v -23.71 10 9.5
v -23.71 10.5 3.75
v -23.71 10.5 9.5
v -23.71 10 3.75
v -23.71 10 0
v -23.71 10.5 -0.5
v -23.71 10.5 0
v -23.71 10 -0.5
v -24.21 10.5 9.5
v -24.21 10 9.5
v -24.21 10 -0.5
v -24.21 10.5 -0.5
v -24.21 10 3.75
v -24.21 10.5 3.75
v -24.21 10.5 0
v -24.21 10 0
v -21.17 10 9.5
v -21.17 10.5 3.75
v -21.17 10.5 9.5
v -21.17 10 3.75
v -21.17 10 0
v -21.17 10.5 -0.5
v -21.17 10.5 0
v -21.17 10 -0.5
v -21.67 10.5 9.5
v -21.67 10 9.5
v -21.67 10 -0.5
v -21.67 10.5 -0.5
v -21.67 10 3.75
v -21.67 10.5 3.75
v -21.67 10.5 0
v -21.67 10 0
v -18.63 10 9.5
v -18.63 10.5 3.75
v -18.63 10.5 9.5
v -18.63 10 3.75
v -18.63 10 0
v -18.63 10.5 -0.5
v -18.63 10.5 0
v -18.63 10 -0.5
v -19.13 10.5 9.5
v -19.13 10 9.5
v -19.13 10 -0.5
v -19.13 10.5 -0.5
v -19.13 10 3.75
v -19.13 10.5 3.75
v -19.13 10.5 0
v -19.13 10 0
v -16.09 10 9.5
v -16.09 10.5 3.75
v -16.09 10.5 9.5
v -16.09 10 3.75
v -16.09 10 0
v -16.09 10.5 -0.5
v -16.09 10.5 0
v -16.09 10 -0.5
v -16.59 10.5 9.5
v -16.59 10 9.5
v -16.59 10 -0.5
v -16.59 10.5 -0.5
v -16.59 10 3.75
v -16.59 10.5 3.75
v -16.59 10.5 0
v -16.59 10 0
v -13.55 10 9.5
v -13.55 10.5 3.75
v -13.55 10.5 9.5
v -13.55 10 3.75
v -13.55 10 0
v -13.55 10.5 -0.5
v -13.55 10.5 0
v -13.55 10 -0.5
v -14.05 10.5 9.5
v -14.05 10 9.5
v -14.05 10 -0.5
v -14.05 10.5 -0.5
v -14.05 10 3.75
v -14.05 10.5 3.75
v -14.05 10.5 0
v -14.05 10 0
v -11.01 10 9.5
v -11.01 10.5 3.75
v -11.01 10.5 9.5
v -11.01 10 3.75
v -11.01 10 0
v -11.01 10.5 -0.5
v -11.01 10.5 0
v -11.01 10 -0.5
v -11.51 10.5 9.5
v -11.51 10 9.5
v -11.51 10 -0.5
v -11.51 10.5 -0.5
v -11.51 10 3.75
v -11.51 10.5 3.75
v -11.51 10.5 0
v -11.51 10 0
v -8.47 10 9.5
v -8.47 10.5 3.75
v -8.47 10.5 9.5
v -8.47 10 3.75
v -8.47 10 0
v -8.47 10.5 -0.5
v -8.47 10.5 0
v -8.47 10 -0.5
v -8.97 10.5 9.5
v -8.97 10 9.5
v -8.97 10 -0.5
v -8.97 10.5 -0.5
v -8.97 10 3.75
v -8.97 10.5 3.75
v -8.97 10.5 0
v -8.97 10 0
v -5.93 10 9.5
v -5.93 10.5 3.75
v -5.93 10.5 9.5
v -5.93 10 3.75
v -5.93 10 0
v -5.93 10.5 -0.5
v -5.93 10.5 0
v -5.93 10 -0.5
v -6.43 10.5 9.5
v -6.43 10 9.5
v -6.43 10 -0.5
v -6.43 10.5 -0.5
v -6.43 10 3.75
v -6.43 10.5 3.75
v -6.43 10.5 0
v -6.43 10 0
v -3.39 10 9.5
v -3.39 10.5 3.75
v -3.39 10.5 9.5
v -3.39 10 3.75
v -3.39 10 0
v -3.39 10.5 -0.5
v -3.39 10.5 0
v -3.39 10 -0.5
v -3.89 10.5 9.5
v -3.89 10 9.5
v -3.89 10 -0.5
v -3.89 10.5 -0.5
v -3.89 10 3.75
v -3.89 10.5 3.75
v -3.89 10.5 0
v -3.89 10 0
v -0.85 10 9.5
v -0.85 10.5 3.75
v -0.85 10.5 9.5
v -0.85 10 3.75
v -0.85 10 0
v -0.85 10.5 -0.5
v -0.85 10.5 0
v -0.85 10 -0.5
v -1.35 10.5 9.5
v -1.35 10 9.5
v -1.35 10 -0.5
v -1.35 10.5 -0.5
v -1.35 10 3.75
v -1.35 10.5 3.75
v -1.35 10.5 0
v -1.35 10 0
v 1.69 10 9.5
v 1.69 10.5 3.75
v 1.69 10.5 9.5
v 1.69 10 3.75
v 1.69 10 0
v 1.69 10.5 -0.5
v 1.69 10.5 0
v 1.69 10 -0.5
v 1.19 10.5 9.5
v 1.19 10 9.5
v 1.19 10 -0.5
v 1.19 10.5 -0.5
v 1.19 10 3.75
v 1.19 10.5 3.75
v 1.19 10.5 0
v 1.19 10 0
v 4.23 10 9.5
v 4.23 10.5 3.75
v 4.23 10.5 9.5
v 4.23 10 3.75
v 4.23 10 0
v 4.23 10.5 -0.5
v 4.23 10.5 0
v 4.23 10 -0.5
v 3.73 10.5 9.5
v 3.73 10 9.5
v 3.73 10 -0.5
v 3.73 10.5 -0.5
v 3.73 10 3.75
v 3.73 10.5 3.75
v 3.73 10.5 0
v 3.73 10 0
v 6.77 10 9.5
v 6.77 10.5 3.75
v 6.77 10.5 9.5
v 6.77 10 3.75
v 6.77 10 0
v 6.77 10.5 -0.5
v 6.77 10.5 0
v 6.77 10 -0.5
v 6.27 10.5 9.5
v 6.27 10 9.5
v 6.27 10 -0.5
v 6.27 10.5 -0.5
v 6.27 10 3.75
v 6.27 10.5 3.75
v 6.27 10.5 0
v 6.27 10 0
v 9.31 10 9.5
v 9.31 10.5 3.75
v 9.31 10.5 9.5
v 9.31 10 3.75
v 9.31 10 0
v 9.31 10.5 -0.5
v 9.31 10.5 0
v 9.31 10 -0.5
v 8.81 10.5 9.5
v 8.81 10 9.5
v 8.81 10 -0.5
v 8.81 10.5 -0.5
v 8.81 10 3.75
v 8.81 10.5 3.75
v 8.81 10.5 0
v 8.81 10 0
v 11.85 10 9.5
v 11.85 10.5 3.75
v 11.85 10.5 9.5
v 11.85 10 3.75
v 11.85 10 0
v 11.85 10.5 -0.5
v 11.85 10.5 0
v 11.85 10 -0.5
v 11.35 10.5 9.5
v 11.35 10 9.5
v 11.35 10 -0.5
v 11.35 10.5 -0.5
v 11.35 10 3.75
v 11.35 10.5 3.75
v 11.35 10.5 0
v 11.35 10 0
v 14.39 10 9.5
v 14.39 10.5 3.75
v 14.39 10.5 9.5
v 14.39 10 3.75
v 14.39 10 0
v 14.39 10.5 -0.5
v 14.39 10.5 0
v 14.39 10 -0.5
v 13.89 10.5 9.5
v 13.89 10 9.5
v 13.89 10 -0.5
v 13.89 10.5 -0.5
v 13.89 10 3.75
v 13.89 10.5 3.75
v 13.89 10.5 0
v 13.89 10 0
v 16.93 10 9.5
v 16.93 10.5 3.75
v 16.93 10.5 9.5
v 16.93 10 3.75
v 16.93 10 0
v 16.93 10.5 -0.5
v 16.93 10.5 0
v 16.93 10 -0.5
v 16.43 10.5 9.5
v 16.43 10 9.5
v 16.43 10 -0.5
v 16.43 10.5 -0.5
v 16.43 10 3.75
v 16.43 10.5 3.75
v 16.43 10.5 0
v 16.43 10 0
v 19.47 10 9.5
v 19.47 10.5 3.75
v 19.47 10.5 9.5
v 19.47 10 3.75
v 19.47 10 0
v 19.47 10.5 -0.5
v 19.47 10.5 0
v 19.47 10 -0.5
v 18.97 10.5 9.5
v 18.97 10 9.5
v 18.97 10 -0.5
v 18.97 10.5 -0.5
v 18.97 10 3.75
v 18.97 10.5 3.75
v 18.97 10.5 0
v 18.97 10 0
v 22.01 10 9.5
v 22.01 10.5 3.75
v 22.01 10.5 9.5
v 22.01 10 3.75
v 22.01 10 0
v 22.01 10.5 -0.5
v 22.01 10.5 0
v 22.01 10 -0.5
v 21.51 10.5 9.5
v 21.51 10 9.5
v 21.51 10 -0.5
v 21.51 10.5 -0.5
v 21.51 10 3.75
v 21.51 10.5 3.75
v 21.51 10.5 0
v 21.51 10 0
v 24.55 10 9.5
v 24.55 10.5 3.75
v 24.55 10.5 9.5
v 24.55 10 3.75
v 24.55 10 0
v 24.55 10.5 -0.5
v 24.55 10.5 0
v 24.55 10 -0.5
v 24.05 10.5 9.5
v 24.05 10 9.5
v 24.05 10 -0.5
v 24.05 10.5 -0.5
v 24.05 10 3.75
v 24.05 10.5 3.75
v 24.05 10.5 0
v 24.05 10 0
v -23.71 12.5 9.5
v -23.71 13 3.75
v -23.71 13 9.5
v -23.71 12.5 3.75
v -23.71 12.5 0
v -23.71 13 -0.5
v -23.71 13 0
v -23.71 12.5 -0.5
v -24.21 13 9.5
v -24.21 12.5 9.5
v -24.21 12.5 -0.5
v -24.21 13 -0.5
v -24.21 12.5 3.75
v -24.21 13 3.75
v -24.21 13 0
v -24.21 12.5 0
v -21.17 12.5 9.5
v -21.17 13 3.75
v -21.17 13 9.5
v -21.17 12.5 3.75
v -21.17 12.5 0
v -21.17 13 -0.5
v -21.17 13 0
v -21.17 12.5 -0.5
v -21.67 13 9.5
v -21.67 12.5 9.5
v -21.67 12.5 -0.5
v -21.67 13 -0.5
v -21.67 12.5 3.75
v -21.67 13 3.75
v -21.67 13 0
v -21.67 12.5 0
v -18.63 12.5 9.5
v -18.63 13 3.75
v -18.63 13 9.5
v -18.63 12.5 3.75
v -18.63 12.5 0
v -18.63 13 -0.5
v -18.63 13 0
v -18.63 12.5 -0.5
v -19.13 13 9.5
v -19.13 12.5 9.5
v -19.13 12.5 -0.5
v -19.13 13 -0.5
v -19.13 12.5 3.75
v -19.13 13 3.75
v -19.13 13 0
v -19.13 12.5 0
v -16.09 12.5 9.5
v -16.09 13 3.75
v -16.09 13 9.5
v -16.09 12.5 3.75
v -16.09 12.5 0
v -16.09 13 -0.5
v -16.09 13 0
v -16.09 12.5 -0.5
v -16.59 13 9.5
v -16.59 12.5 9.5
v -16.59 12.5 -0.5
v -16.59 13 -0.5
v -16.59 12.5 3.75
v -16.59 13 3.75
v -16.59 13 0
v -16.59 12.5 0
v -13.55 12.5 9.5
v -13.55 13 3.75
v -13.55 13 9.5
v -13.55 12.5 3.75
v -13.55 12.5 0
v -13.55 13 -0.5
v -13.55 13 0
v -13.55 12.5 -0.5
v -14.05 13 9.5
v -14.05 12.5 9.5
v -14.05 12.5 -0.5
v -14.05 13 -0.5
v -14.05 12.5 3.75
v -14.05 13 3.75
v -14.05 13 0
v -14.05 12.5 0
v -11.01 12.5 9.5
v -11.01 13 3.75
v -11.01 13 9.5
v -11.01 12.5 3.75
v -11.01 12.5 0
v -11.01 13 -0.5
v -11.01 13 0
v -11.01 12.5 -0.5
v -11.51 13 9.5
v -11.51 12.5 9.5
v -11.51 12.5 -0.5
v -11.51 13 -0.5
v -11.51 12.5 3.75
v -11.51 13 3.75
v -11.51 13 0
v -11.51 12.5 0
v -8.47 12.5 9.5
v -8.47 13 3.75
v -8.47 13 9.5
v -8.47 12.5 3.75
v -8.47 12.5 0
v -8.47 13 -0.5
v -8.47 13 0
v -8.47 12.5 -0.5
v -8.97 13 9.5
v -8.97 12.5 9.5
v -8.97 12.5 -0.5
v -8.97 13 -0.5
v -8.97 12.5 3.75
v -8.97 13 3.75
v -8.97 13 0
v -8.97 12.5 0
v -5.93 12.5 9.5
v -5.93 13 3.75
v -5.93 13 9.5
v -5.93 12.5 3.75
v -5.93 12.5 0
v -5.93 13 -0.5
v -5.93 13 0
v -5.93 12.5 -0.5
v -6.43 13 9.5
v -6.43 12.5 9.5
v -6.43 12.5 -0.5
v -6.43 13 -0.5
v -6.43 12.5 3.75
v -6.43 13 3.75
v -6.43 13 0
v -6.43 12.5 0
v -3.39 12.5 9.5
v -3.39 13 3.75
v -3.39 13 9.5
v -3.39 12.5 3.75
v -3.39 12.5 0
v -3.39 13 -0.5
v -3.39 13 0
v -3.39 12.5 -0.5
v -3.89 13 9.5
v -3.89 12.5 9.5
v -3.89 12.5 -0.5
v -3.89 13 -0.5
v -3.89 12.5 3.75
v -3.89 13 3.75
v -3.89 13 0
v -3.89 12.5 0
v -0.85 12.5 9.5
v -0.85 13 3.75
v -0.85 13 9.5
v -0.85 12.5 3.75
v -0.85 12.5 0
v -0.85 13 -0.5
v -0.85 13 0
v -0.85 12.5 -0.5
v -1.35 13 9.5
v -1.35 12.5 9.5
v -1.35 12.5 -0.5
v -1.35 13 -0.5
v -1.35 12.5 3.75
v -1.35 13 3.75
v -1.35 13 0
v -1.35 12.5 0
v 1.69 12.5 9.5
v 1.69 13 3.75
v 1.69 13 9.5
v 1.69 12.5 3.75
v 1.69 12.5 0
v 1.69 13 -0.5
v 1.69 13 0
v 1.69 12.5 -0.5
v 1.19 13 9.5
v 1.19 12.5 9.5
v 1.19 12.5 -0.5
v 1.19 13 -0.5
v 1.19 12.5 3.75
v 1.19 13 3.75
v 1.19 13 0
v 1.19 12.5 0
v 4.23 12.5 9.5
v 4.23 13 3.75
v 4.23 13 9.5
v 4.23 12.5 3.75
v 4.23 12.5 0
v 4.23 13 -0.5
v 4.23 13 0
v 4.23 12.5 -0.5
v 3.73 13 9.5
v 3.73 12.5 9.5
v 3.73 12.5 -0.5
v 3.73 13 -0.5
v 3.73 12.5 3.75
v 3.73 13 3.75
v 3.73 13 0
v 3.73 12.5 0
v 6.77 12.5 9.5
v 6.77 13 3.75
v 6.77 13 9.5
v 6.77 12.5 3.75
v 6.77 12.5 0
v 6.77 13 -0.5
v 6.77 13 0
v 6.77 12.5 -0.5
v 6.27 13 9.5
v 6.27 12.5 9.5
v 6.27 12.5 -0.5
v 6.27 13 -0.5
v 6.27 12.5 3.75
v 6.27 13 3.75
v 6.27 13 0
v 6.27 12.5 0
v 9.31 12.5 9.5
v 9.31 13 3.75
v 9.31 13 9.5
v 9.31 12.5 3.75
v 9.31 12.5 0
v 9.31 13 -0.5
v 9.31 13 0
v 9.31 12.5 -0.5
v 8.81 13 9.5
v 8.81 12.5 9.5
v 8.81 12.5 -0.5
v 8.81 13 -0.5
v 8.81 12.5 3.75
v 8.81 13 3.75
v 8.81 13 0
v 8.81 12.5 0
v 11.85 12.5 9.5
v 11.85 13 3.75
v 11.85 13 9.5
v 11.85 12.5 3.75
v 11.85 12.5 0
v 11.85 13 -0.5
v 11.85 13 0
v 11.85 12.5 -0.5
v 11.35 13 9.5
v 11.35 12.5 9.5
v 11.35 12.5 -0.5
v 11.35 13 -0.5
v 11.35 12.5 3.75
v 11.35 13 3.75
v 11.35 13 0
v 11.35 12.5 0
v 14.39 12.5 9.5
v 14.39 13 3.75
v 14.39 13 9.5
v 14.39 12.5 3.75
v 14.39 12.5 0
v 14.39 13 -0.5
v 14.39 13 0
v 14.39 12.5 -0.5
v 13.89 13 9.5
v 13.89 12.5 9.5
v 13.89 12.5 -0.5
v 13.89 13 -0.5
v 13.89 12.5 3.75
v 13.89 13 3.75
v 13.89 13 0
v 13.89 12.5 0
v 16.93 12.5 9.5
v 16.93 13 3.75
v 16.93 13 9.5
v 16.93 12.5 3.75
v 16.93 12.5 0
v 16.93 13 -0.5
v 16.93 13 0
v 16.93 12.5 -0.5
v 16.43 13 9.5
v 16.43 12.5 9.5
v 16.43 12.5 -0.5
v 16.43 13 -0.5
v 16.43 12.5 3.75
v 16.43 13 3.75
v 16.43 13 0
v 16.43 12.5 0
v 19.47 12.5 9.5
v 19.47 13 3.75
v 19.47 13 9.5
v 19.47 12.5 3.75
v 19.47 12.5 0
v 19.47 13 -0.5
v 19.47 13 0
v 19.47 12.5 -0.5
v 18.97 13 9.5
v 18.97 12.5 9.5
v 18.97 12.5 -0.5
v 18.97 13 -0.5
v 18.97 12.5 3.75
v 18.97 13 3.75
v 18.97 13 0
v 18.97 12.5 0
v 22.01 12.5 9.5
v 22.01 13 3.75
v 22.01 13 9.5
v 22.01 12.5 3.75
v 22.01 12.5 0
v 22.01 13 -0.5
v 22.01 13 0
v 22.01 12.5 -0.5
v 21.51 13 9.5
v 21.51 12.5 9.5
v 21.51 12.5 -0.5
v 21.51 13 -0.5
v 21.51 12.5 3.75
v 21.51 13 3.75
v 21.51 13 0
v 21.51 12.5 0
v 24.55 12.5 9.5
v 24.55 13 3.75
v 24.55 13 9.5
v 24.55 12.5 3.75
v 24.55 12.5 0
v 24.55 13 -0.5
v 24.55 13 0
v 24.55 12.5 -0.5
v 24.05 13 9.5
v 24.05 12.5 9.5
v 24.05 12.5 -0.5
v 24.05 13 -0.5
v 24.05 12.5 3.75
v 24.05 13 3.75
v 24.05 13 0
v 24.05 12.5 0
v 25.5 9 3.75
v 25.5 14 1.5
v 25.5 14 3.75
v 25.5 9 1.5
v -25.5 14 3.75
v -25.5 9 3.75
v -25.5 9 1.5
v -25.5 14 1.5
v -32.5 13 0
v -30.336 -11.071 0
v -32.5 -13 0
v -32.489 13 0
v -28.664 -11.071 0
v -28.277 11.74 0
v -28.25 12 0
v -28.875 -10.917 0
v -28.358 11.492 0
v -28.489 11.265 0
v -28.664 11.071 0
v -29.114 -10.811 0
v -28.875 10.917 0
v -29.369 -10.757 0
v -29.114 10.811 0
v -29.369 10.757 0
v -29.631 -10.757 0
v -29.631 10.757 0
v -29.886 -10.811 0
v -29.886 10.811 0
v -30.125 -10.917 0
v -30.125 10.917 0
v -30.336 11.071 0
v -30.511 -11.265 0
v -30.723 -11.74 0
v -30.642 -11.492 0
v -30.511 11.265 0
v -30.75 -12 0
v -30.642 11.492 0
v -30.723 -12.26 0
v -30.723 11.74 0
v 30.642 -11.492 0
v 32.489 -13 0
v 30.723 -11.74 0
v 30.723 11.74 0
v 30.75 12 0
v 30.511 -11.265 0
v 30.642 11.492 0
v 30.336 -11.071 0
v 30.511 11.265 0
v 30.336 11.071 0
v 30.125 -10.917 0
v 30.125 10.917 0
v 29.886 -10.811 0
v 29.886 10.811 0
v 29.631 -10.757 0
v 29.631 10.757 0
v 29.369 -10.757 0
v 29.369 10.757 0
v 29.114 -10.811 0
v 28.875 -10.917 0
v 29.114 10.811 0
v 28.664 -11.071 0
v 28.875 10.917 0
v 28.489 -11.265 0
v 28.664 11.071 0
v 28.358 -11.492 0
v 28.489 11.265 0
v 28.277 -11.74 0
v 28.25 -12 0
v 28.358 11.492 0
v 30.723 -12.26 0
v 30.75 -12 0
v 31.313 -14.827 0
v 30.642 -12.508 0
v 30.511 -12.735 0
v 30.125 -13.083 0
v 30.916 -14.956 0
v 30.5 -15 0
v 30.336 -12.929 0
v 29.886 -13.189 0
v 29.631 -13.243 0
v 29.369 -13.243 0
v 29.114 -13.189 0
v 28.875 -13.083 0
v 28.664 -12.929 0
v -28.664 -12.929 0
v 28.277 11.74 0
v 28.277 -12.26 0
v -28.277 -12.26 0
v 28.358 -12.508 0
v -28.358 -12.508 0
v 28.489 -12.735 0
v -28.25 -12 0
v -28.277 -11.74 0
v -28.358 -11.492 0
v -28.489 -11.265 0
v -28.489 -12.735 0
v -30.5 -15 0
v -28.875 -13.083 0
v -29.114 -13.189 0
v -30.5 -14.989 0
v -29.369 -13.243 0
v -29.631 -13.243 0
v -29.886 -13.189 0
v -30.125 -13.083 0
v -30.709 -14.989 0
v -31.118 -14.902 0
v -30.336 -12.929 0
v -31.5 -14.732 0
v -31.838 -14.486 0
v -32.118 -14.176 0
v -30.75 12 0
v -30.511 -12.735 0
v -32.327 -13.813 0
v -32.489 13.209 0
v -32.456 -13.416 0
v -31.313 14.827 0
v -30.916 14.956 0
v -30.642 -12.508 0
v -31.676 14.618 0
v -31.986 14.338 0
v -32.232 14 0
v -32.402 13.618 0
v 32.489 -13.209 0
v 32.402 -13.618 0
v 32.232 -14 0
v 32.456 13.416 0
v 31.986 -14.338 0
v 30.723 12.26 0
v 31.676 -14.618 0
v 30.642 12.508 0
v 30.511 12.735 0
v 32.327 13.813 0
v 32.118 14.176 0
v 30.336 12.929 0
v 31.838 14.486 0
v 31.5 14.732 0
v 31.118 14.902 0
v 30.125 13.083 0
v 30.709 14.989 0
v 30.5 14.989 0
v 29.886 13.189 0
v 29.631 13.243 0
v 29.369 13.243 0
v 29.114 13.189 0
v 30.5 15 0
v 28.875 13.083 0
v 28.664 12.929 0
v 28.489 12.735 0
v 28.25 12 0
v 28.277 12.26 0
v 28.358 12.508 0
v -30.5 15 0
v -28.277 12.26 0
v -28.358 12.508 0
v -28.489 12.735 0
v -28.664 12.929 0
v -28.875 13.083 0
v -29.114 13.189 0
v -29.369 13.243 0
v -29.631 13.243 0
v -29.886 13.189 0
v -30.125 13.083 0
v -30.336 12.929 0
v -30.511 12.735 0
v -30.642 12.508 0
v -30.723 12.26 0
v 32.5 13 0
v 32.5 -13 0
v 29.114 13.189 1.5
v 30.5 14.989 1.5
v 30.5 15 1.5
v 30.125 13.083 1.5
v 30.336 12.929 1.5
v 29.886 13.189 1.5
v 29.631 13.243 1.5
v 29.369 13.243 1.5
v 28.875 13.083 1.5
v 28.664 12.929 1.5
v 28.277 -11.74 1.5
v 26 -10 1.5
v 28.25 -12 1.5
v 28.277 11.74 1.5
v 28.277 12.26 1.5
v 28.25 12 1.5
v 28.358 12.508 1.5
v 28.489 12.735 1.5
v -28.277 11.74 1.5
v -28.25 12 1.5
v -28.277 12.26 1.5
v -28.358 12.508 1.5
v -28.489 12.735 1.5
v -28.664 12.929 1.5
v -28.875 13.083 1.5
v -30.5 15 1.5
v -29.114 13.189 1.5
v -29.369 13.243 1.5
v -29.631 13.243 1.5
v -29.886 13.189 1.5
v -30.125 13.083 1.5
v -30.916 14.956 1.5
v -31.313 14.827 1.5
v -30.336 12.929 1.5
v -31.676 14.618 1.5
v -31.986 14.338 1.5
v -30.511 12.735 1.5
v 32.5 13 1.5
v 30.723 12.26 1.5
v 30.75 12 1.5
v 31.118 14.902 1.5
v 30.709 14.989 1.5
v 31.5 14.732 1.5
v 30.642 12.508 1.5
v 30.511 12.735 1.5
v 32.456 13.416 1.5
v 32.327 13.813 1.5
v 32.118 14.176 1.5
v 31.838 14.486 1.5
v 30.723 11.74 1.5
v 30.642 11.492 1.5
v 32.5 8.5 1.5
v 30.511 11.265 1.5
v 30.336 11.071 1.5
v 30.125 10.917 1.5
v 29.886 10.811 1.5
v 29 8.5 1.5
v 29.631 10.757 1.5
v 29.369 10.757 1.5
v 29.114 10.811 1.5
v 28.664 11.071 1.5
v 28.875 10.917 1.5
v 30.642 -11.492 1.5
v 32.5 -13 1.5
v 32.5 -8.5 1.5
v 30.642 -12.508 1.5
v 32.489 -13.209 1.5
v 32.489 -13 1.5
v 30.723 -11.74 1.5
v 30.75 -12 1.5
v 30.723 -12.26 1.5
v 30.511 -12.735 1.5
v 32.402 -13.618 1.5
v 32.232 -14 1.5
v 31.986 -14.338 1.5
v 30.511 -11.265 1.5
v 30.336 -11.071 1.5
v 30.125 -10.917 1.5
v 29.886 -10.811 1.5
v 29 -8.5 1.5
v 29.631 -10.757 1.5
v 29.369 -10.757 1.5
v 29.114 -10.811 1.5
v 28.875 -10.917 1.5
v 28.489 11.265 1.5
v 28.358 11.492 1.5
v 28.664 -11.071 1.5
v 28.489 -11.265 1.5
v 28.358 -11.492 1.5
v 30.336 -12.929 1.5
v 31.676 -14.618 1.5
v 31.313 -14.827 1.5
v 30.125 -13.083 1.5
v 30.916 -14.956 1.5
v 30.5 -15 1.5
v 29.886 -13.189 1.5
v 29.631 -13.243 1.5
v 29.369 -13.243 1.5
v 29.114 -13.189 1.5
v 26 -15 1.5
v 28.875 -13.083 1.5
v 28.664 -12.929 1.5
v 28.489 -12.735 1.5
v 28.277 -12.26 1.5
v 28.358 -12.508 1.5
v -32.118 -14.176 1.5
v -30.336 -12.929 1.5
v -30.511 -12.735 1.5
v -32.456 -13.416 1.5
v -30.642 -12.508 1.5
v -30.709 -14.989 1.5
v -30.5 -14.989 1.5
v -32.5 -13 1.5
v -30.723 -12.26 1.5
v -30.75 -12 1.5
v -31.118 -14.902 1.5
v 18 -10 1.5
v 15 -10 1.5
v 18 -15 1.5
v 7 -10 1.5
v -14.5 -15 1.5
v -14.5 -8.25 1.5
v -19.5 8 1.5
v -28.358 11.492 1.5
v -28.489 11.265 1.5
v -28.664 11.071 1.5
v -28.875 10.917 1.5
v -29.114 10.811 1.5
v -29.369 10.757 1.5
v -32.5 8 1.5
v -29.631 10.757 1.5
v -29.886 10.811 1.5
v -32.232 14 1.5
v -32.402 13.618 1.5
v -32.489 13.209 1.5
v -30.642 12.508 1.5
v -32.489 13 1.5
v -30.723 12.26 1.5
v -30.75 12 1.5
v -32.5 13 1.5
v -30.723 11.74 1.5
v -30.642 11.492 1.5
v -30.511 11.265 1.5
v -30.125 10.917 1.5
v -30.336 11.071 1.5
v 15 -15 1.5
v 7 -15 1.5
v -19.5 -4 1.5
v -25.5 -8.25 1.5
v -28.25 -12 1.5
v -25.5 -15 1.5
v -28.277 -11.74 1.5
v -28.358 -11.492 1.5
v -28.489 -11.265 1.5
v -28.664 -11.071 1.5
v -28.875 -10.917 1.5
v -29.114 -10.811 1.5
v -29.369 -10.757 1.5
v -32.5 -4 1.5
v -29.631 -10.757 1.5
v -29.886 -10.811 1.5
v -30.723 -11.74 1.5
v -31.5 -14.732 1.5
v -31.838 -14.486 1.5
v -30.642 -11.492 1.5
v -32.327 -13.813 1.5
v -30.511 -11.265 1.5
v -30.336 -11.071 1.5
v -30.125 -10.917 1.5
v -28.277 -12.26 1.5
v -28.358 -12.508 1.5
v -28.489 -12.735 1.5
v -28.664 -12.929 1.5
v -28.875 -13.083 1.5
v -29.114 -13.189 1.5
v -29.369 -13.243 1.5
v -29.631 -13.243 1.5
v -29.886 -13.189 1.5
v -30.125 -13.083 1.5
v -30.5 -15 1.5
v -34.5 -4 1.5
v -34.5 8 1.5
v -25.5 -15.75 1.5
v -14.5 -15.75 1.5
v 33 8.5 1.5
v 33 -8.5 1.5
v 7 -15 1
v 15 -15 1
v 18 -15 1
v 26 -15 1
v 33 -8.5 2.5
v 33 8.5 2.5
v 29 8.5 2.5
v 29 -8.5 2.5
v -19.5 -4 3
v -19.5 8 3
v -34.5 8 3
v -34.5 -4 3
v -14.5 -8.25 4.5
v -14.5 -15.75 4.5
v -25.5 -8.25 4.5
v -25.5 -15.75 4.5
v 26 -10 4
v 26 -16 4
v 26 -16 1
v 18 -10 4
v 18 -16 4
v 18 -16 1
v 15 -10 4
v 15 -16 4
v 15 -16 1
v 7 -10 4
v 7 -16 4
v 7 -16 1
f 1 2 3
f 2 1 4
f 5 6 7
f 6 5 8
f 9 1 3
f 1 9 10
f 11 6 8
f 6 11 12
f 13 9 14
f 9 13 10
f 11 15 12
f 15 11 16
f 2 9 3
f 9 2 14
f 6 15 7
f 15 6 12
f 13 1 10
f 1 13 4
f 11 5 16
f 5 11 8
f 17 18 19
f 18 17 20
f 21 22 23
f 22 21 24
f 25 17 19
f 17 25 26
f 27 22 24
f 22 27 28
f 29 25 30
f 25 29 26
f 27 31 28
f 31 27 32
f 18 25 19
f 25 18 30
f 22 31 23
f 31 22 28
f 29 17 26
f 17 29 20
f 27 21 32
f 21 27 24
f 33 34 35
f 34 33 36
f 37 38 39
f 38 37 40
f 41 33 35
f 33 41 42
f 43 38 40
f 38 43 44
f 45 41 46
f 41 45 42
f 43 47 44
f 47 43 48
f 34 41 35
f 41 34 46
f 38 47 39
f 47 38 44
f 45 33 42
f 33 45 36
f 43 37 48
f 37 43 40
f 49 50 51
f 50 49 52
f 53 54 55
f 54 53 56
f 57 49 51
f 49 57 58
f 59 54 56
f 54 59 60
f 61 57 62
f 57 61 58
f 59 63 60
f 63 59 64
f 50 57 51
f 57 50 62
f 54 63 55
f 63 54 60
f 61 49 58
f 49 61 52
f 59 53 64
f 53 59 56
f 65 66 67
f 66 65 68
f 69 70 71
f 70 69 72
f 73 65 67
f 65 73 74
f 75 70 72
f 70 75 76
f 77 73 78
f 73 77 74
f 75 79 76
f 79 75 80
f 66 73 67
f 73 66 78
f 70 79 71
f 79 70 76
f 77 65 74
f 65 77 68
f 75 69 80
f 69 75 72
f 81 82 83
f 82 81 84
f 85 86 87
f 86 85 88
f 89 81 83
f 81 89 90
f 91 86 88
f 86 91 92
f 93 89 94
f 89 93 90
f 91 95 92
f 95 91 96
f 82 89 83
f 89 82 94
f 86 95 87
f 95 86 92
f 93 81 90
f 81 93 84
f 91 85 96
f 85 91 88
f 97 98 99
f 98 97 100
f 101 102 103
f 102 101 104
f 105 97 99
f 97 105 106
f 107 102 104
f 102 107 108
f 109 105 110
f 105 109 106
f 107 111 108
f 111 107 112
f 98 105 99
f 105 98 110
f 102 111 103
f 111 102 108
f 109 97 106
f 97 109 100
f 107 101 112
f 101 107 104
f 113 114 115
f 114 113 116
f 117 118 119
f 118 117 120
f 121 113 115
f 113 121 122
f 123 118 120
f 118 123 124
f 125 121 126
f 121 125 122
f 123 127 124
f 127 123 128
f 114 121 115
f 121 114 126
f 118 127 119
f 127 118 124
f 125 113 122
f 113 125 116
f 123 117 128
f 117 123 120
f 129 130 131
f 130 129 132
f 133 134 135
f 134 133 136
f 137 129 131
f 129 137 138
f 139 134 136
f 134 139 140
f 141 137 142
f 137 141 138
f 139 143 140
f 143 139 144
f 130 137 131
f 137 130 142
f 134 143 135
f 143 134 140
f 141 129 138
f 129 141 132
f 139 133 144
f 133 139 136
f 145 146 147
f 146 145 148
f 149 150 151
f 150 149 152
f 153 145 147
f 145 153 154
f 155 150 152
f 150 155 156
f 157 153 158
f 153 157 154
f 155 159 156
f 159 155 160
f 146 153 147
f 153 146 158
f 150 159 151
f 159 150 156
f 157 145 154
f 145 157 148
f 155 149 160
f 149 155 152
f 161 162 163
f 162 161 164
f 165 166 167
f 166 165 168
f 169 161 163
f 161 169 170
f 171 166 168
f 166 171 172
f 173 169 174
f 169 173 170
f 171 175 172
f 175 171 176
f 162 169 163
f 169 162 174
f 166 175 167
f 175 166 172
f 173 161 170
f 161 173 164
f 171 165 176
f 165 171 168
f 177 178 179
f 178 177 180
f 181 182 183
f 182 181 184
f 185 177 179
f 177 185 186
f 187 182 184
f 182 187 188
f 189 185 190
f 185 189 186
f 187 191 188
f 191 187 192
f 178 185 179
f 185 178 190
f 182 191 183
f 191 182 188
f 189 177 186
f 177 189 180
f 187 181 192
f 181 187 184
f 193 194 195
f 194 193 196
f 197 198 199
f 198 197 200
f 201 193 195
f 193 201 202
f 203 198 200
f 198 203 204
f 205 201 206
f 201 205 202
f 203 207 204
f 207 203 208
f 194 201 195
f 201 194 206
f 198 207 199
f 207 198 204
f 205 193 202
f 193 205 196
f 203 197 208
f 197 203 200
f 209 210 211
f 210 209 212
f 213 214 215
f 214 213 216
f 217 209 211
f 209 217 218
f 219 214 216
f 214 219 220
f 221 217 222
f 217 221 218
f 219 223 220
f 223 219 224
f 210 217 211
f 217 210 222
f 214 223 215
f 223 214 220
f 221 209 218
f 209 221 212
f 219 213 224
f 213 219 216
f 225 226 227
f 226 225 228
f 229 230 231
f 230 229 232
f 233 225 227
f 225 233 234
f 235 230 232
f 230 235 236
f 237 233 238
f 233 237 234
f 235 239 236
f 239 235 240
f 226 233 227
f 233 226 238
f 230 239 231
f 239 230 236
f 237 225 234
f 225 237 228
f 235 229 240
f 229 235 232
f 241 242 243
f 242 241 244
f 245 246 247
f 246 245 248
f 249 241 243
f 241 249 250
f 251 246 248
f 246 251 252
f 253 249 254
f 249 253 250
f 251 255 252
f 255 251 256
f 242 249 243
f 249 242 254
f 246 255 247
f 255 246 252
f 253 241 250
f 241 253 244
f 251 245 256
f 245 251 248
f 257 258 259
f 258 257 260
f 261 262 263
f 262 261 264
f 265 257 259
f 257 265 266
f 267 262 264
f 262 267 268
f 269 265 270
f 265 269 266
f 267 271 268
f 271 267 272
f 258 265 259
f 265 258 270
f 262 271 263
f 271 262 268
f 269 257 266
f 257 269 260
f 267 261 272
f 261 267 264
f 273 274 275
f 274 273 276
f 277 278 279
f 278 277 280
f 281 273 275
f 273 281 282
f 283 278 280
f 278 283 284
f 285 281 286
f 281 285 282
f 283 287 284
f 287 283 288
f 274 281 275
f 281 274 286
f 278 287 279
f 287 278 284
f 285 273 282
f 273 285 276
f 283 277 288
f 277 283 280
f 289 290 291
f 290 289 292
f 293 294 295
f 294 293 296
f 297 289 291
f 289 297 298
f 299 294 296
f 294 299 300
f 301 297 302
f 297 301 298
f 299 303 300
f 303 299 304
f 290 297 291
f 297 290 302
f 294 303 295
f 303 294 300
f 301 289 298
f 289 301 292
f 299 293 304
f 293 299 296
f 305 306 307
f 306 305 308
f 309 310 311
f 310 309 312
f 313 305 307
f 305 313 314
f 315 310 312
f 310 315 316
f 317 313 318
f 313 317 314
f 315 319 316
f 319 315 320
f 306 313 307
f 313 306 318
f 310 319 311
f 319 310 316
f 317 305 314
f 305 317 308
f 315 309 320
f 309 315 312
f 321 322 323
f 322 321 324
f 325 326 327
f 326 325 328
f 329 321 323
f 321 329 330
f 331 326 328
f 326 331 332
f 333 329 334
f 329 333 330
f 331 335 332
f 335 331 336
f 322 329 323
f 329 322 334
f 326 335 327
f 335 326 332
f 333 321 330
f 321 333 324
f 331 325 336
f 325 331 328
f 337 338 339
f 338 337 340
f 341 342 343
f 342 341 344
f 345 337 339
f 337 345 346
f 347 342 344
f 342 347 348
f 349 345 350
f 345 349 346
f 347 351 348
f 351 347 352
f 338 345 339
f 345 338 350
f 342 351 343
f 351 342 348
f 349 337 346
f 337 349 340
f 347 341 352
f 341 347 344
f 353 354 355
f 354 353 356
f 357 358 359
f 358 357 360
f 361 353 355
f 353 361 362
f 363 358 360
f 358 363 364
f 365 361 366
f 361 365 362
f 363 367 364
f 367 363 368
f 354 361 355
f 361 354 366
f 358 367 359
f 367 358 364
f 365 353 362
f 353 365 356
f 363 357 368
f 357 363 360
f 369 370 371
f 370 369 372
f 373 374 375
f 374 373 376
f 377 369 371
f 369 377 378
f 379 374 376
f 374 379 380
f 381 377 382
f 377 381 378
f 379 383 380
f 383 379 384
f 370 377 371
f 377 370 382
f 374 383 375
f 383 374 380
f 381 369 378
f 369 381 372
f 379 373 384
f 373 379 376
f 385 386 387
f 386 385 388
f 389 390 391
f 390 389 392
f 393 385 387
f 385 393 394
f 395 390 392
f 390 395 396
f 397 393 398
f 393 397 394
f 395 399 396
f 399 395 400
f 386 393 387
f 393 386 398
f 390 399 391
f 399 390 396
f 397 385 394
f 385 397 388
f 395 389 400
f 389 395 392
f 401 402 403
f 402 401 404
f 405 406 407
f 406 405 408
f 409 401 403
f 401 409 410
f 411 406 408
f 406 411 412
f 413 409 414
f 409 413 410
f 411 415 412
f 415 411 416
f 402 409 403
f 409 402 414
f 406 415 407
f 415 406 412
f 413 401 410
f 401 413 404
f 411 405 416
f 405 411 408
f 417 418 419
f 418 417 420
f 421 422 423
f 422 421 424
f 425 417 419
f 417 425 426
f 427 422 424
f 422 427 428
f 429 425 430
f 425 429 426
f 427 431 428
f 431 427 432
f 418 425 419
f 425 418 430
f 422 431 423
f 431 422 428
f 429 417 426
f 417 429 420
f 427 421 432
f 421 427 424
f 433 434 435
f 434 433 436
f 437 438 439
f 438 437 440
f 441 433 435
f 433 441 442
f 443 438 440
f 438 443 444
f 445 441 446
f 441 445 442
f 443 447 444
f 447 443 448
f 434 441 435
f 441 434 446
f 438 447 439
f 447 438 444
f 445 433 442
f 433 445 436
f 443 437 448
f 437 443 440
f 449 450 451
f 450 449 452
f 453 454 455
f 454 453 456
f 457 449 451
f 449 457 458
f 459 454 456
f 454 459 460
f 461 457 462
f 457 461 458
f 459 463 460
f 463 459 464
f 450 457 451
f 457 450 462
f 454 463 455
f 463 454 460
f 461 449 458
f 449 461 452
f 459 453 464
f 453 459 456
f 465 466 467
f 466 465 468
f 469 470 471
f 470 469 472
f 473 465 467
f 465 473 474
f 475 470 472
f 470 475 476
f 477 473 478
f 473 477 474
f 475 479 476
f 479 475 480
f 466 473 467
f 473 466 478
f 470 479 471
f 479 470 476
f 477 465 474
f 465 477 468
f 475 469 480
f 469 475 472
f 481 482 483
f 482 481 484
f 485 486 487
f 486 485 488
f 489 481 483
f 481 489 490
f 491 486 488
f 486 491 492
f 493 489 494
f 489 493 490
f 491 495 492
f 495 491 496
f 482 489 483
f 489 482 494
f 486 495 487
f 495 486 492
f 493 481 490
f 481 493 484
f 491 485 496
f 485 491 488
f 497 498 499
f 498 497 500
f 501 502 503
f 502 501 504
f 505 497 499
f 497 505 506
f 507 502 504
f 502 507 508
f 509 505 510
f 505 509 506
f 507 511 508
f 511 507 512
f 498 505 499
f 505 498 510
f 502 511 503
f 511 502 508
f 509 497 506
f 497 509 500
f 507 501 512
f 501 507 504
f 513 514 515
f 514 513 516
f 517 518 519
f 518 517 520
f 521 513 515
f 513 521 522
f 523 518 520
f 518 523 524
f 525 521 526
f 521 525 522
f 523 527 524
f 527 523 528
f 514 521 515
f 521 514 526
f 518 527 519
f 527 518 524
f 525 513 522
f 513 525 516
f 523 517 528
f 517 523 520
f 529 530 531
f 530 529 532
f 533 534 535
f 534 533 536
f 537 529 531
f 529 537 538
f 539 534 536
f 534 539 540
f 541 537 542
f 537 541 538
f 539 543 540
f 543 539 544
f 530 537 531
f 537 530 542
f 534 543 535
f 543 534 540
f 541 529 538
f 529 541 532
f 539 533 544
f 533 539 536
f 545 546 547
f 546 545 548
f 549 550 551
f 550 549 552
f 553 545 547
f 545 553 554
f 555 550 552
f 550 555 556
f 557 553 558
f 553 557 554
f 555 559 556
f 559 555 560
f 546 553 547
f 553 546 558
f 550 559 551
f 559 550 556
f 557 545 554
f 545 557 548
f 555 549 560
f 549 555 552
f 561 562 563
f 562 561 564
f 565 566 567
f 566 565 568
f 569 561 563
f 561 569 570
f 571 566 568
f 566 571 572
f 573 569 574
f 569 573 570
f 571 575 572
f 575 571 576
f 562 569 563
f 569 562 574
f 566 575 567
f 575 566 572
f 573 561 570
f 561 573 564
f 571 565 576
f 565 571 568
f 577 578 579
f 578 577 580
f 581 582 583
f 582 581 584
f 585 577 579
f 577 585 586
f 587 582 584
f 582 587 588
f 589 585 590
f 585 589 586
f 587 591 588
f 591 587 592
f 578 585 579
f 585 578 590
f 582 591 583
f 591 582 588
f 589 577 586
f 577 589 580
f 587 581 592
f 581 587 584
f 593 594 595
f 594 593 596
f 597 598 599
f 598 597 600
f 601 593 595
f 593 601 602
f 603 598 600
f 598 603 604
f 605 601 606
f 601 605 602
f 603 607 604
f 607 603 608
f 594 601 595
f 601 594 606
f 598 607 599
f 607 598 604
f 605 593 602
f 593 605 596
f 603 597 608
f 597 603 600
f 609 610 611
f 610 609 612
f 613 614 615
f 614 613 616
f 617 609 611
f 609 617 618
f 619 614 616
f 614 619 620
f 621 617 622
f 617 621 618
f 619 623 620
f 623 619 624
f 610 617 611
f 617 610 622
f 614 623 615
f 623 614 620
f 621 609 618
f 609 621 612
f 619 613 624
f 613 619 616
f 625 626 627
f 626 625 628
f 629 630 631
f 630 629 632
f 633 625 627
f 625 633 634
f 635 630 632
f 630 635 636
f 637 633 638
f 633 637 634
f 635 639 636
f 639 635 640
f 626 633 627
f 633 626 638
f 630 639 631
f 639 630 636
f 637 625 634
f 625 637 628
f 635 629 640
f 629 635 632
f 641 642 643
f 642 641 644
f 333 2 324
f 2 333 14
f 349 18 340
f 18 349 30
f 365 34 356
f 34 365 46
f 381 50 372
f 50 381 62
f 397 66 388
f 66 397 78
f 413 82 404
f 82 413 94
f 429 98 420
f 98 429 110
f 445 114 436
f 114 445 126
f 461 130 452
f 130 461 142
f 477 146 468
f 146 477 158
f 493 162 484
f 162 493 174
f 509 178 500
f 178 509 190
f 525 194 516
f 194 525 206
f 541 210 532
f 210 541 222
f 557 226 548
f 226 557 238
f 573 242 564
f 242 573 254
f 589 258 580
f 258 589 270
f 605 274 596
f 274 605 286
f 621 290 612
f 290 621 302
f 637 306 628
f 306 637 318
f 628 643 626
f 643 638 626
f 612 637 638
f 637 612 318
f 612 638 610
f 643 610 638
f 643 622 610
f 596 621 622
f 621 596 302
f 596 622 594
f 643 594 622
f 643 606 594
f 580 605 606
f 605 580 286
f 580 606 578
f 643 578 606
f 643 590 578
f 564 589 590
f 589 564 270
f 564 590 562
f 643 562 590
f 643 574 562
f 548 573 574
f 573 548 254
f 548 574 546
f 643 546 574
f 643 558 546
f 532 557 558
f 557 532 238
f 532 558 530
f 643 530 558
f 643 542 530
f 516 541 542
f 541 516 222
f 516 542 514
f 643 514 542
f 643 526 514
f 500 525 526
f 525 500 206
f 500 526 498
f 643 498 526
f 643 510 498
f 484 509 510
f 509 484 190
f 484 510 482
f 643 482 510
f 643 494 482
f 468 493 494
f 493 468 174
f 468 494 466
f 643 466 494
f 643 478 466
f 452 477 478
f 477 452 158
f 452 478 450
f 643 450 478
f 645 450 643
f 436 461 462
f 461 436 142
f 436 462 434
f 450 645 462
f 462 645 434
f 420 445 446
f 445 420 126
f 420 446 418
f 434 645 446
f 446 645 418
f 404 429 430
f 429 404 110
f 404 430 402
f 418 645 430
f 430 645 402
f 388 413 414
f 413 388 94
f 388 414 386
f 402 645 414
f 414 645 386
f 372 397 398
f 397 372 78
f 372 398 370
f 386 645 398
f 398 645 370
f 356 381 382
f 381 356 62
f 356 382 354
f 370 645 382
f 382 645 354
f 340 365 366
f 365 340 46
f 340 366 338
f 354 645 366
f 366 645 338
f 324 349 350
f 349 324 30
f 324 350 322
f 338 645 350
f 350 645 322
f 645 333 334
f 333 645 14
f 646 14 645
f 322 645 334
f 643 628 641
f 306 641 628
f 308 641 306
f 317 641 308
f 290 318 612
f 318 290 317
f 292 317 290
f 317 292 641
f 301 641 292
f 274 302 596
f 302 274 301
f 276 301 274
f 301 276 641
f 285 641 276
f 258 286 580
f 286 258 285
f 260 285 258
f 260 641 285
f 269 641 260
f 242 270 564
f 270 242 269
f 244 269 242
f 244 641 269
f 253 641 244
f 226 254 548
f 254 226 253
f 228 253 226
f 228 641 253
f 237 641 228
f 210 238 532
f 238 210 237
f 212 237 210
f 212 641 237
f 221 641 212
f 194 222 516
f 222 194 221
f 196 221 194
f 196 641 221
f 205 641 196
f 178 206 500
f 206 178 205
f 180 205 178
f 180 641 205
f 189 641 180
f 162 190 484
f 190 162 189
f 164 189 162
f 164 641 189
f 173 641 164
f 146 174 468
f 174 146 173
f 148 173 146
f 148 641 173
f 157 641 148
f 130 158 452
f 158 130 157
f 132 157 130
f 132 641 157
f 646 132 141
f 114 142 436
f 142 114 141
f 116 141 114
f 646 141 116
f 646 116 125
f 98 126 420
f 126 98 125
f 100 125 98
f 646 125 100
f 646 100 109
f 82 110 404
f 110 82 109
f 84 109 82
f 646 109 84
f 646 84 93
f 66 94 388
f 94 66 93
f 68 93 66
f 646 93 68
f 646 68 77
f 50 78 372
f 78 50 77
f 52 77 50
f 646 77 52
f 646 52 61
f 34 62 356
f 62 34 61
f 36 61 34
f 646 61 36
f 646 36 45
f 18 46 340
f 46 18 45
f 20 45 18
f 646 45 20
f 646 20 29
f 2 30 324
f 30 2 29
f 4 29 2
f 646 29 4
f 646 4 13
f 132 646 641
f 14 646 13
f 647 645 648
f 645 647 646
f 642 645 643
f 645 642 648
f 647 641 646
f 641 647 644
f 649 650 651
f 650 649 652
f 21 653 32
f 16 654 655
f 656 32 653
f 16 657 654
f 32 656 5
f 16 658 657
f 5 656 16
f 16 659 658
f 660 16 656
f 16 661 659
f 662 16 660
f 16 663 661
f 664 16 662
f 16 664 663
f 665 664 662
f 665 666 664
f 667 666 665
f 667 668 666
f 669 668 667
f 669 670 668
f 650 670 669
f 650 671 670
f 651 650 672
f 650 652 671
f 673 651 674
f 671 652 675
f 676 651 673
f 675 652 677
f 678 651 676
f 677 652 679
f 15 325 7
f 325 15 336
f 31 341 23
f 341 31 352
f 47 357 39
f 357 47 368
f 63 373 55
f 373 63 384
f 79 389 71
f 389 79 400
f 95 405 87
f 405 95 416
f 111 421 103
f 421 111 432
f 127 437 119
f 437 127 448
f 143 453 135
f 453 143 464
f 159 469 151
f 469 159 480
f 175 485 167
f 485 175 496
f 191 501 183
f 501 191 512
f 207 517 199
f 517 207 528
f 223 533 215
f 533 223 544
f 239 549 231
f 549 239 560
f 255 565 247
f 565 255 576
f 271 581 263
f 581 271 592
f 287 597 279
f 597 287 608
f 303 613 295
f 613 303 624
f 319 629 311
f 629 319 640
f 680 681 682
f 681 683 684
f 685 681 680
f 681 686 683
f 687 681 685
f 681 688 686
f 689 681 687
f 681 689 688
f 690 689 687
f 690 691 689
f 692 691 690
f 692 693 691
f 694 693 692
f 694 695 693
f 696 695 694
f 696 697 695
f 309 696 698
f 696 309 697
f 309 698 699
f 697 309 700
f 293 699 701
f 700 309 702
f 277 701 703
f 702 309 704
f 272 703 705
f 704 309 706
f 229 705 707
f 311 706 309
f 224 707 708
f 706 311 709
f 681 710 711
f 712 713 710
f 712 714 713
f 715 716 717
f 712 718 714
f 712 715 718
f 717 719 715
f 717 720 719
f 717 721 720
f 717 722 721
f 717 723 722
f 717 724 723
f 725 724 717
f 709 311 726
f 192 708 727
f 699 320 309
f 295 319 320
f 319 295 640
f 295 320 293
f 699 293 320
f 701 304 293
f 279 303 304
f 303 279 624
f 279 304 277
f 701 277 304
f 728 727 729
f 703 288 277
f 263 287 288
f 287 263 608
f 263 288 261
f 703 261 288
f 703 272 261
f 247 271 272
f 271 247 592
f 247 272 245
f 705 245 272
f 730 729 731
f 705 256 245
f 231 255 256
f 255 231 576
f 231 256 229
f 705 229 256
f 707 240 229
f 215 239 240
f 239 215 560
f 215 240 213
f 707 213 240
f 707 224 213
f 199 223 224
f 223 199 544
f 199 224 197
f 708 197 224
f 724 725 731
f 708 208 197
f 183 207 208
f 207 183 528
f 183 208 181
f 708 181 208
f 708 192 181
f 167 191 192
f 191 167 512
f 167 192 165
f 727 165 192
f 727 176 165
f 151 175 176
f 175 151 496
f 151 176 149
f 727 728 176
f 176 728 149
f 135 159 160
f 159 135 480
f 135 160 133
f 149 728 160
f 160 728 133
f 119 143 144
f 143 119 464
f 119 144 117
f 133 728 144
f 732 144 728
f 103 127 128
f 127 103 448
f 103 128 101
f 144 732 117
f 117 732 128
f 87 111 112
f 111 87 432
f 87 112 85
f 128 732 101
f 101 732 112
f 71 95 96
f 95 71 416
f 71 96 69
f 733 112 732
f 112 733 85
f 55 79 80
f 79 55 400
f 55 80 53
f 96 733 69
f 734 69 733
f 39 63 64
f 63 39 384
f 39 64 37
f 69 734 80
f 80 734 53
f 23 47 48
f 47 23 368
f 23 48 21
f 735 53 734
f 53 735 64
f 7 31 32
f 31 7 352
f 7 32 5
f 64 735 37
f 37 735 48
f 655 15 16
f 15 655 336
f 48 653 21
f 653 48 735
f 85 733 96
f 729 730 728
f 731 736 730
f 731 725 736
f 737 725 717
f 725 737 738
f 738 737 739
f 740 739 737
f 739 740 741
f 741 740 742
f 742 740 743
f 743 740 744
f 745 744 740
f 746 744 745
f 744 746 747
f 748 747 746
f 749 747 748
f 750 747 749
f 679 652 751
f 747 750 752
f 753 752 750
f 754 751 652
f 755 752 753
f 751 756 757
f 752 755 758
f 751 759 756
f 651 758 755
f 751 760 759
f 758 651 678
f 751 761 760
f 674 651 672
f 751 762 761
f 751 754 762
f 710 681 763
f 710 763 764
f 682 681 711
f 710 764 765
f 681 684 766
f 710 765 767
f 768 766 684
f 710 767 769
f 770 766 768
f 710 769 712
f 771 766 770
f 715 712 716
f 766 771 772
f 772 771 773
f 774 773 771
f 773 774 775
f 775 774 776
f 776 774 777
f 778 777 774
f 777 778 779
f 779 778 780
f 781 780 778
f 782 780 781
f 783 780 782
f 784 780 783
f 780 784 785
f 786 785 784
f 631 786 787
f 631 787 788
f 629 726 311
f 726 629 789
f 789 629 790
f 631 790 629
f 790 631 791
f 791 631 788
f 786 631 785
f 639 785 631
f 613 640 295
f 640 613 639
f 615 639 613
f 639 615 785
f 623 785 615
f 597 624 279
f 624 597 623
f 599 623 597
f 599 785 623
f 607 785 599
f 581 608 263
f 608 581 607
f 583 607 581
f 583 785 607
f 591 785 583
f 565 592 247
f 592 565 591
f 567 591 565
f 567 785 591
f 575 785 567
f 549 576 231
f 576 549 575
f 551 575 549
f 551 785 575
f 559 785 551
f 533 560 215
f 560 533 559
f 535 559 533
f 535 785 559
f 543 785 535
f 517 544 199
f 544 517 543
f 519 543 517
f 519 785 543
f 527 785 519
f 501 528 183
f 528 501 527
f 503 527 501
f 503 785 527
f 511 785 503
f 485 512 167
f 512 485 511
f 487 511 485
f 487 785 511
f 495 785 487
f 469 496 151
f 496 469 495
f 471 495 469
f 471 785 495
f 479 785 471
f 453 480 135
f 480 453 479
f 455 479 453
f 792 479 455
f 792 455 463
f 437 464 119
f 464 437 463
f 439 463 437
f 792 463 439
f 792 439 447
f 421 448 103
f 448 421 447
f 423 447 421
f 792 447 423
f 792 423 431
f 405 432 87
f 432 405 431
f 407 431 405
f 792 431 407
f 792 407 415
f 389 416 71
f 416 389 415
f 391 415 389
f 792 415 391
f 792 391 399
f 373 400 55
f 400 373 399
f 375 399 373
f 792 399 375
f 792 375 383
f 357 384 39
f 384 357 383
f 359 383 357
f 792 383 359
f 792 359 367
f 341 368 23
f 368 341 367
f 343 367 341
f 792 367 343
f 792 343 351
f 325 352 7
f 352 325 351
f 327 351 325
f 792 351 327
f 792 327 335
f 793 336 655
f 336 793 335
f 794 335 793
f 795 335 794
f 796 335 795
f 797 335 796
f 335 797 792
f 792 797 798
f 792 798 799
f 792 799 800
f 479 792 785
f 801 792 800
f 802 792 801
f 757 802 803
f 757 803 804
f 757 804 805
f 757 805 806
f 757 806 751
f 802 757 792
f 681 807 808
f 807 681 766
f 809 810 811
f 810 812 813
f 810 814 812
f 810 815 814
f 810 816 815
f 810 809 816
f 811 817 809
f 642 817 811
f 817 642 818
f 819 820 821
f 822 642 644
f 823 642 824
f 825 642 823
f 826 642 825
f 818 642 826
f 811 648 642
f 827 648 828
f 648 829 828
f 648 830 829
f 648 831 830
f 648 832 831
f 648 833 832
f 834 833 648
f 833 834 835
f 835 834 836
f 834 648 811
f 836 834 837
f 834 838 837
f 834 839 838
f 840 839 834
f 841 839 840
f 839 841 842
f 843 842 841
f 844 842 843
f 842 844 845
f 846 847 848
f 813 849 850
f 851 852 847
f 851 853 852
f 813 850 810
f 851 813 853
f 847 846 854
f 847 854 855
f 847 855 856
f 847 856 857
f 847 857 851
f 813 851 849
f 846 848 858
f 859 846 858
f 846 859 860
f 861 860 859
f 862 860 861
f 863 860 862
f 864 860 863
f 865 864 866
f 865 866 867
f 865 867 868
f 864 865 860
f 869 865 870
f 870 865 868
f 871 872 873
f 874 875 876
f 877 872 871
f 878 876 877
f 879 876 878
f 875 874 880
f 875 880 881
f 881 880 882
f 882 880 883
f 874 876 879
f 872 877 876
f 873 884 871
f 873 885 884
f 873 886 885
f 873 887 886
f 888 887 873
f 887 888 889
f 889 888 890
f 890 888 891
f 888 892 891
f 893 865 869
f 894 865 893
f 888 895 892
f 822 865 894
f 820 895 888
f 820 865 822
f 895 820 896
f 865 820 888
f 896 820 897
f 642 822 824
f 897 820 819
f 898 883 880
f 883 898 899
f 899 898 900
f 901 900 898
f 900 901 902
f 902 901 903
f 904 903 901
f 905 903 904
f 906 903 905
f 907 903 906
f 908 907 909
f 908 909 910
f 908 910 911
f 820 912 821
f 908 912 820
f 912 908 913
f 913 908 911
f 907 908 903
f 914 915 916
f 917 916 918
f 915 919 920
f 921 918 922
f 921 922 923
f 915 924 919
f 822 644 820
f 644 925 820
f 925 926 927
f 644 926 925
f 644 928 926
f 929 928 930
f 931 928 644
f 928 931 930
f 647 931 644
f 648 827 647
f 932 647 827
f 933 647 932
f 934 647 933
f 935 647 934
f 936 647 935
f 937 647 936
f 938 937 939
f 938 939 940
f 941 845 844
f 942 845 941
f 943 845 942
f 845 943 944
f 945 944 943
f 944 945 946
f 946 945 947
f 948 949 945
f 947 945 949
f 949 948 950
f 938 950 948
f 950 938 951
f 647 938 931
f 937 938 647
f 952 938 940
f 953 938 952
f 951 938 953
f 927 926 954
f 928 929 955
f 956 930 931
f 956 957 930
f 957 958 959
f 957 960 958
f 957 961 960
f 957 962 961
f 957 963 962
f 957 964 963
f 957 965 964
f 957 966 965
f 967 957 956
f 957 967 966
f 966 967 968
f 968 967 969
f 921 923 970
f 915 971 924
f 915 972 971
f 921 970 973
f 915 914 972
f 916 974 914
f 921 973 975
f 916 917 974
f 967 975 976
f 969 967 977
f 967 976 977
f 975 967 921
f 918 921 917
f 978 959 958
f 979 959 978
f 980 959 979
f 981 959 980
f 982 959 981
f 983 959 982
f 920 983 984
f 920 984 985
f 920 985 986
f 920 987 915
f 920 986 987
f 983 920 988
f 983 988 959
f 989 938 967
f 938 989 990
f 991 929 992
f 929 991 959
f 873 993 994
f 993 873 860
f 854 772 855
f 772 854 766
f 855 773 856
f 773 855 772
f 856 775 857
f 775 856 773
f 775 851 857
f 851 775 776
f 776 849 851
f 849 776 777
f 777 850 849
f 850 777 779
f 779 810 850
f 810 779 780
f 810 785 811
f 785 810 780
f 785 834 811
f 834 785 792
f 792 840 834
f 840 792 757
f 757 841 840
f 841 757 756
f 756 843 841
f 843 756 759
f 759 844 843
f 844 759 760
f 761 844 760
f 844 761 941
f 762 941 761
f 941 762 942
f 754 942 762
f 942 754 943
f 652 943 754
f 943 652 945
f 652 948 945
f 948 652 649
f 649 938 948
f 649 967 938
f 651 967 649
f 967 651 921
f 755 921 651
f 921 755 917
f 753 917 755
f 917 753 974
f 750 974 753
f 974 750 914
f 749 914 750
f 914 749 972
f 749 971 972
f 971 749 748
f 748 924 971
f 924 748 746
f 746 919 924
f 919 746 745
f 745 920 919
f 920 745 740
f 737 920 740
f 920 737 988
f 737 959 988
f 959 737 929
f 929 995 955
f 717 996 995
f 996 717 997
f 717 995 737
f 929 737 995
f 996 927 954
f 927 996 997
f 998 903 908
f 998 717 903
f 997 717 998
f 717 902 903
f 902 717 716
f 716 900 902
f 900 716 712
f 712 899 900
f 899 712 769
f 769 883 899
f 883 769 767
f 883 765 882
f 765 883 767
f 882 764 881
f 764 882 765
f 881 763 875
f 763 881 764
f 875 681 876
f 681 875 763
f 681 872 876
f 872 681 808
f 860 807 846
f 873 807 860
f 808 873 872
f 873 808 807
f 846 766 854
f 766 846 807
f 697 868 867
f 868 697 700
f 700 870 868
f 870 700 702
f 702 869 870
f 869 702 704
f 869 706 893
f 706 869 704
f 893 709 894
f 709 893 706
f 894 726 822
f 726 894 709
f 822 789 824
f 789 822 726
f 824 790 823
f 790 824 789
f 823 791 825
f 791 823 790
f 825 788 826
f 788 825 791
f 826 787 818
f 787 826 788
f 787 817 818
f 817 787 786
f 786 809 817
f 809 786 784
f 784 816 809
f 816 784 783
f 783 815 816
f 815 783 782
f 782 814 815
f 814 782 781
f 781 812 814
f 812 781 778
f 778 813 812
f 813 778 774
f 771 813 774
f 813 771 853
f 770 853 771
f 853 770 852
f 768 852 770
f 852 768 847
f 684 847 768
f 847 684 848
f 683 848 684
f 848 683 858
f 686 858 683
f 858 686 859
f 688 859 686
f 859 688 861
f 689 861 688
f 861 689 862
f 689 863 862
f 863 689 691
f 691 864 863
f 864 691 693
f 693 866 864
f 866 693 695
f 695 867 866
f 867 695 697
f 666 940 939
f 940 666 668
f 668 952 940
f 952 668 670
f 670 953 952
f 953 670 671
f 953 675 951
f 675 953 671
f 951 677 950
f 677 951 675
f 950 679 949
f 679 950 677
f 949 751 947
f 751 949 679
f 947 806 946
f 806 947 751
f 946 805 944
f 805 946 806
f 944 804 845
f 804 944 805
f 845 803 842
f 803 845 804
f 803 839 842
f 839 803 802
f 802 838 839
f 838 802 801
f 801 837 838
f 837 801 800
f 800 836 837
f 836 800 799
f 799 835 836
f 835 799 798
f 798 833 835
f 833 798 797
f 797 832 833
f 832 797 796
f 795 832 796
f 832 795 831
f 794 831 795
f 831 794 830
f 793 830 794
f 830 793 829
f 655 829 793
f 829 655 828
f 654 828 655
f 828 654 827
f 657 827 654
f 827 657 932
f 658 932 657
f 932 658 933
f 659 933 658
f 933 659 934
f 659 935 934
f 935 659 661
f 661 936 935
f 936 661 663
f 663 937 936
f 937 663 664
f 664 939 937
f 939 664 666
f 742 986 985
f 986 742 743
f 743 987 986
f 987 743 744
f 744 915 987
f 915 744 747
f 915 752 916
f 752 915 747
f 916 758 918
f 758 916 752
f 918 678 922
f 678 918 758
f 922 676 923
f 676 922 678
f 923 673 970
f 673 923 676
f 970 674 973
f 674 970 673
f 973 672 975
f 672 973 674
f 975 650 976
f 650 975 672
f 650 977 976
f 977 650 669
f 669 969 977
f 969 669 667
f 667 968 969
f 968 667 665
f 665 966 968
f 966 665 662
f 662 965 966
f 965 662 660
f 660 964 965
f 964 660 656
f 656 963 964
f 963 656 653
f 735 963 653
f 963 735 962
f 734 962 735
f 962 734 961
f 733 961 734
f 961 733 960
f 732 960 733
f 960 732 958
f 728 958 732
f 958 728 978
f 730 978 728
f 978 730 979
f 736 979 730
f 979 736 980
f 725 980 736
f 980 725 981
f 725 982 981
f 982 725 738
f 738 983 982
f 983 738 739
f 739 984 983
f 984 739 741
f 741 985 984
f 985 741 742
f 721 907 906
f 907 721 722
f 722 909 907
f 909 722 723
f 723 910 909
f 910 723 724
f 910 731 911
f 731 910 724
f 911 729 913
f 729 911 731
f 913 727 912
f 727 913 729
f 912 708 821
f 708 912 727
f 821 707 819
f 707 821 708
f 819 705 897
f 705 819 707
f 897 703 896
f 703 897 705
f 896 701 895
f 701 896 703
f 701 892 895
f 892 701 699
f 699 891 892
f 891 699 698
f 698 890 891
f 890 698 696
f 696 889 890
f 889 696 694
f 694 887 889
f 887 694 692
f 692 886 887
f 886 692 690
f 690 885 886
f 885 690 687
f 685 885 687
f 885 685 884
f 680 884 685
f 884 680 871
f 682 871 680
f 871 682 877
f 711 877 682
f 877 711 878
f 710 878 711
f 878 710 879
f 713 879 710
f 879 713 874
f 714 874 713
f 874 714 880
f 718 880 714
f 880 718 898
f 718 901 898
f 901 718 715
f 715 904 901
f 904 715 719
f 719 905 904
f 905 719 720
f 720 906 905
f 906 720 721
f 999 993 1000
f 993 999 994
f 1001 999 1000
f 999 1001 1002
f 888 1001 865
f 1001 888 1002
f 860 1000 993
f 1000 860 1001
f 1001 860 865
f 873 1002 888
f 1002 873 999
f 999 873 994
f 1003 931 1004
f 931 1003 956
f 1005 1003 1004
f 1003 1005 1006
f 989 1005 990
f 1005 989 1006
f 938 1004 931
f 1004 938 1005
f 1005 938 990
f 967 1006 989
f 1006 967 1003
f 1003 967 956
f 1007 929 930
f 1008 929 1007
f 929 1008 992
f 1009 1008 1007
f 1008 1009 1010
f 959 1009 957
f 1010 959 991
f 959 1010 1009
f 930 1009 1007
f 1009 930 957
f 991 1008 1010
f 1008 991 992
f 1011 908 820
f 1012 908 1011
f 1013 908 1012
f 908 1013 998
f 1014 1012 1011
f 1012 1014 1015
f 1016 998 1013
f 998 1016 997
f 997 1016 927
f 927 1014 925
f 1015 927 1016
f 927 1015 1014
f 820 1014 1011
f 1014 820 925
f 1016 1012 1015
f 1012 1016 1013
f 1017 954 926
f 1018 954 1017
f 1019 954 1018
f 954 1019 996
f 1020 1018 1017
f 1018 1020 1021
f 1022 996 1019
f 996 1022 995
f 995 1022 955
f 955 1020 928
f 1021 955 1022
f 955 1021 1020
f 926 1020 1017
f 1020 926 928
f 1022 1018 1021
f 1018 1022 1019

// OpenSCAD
module raspberryPiZero() {
    module fillet(r=1, pos=1) {
        rotate([0, 0, 90*(pos-1)]) {
            difference() {
                square(size=[r, r]);
                circle(r=r, $fn=30);
            }
        }
    }

    function square_corner(i=1) = ((i%4 < 2) ? 1 : -1);
    linear_extrude(height=1.5){
        difference() {
            square(size=[65, 30], center=true);
            for(i = [1:4]) {
                translate([30.5*square_corner(i), 13*square_corner(i-1), 0]) {
                    fillet(r=2, pos=i);
                }
            }
            for(i = [1:4]) {
                translate([29.5*square_corner(i), 12*square_corner(i-1), 0]) {
                    circle(r=1.25, $fn=30);
                }
            }
        }
    }

    translate([0, 11.5, 2.5]) {
        union() {
            cube([51, 5, 2.5], center=true);
            for(i = [-1:2:1]) {
                for(j = [1:20]) {
                    translate([j*2.54-26.5, i*1.25, 2]) {
                        cube(size=[0.5, 0.5, 10], center=true);
                    }
                }
            }
        }
    }

    translate([31, 0, 2]) {
        cube([4, 17, 1], center=true);
    }

    translate([-27, 2, 2.25]) {
        cube([15, 12, 1.5], center=true);
    }

    translate([-20, -12, 3]) {
        cube([11, 7.5, 3], center=true);
    }

    translate([22, -13, 2.5]){
        cube([8, 6, 3], center=true);
    }

    translate([11, -13, 2.5]){
        cube([8, 6, 3], center=true);
    }
}

raspberryPiZero();
